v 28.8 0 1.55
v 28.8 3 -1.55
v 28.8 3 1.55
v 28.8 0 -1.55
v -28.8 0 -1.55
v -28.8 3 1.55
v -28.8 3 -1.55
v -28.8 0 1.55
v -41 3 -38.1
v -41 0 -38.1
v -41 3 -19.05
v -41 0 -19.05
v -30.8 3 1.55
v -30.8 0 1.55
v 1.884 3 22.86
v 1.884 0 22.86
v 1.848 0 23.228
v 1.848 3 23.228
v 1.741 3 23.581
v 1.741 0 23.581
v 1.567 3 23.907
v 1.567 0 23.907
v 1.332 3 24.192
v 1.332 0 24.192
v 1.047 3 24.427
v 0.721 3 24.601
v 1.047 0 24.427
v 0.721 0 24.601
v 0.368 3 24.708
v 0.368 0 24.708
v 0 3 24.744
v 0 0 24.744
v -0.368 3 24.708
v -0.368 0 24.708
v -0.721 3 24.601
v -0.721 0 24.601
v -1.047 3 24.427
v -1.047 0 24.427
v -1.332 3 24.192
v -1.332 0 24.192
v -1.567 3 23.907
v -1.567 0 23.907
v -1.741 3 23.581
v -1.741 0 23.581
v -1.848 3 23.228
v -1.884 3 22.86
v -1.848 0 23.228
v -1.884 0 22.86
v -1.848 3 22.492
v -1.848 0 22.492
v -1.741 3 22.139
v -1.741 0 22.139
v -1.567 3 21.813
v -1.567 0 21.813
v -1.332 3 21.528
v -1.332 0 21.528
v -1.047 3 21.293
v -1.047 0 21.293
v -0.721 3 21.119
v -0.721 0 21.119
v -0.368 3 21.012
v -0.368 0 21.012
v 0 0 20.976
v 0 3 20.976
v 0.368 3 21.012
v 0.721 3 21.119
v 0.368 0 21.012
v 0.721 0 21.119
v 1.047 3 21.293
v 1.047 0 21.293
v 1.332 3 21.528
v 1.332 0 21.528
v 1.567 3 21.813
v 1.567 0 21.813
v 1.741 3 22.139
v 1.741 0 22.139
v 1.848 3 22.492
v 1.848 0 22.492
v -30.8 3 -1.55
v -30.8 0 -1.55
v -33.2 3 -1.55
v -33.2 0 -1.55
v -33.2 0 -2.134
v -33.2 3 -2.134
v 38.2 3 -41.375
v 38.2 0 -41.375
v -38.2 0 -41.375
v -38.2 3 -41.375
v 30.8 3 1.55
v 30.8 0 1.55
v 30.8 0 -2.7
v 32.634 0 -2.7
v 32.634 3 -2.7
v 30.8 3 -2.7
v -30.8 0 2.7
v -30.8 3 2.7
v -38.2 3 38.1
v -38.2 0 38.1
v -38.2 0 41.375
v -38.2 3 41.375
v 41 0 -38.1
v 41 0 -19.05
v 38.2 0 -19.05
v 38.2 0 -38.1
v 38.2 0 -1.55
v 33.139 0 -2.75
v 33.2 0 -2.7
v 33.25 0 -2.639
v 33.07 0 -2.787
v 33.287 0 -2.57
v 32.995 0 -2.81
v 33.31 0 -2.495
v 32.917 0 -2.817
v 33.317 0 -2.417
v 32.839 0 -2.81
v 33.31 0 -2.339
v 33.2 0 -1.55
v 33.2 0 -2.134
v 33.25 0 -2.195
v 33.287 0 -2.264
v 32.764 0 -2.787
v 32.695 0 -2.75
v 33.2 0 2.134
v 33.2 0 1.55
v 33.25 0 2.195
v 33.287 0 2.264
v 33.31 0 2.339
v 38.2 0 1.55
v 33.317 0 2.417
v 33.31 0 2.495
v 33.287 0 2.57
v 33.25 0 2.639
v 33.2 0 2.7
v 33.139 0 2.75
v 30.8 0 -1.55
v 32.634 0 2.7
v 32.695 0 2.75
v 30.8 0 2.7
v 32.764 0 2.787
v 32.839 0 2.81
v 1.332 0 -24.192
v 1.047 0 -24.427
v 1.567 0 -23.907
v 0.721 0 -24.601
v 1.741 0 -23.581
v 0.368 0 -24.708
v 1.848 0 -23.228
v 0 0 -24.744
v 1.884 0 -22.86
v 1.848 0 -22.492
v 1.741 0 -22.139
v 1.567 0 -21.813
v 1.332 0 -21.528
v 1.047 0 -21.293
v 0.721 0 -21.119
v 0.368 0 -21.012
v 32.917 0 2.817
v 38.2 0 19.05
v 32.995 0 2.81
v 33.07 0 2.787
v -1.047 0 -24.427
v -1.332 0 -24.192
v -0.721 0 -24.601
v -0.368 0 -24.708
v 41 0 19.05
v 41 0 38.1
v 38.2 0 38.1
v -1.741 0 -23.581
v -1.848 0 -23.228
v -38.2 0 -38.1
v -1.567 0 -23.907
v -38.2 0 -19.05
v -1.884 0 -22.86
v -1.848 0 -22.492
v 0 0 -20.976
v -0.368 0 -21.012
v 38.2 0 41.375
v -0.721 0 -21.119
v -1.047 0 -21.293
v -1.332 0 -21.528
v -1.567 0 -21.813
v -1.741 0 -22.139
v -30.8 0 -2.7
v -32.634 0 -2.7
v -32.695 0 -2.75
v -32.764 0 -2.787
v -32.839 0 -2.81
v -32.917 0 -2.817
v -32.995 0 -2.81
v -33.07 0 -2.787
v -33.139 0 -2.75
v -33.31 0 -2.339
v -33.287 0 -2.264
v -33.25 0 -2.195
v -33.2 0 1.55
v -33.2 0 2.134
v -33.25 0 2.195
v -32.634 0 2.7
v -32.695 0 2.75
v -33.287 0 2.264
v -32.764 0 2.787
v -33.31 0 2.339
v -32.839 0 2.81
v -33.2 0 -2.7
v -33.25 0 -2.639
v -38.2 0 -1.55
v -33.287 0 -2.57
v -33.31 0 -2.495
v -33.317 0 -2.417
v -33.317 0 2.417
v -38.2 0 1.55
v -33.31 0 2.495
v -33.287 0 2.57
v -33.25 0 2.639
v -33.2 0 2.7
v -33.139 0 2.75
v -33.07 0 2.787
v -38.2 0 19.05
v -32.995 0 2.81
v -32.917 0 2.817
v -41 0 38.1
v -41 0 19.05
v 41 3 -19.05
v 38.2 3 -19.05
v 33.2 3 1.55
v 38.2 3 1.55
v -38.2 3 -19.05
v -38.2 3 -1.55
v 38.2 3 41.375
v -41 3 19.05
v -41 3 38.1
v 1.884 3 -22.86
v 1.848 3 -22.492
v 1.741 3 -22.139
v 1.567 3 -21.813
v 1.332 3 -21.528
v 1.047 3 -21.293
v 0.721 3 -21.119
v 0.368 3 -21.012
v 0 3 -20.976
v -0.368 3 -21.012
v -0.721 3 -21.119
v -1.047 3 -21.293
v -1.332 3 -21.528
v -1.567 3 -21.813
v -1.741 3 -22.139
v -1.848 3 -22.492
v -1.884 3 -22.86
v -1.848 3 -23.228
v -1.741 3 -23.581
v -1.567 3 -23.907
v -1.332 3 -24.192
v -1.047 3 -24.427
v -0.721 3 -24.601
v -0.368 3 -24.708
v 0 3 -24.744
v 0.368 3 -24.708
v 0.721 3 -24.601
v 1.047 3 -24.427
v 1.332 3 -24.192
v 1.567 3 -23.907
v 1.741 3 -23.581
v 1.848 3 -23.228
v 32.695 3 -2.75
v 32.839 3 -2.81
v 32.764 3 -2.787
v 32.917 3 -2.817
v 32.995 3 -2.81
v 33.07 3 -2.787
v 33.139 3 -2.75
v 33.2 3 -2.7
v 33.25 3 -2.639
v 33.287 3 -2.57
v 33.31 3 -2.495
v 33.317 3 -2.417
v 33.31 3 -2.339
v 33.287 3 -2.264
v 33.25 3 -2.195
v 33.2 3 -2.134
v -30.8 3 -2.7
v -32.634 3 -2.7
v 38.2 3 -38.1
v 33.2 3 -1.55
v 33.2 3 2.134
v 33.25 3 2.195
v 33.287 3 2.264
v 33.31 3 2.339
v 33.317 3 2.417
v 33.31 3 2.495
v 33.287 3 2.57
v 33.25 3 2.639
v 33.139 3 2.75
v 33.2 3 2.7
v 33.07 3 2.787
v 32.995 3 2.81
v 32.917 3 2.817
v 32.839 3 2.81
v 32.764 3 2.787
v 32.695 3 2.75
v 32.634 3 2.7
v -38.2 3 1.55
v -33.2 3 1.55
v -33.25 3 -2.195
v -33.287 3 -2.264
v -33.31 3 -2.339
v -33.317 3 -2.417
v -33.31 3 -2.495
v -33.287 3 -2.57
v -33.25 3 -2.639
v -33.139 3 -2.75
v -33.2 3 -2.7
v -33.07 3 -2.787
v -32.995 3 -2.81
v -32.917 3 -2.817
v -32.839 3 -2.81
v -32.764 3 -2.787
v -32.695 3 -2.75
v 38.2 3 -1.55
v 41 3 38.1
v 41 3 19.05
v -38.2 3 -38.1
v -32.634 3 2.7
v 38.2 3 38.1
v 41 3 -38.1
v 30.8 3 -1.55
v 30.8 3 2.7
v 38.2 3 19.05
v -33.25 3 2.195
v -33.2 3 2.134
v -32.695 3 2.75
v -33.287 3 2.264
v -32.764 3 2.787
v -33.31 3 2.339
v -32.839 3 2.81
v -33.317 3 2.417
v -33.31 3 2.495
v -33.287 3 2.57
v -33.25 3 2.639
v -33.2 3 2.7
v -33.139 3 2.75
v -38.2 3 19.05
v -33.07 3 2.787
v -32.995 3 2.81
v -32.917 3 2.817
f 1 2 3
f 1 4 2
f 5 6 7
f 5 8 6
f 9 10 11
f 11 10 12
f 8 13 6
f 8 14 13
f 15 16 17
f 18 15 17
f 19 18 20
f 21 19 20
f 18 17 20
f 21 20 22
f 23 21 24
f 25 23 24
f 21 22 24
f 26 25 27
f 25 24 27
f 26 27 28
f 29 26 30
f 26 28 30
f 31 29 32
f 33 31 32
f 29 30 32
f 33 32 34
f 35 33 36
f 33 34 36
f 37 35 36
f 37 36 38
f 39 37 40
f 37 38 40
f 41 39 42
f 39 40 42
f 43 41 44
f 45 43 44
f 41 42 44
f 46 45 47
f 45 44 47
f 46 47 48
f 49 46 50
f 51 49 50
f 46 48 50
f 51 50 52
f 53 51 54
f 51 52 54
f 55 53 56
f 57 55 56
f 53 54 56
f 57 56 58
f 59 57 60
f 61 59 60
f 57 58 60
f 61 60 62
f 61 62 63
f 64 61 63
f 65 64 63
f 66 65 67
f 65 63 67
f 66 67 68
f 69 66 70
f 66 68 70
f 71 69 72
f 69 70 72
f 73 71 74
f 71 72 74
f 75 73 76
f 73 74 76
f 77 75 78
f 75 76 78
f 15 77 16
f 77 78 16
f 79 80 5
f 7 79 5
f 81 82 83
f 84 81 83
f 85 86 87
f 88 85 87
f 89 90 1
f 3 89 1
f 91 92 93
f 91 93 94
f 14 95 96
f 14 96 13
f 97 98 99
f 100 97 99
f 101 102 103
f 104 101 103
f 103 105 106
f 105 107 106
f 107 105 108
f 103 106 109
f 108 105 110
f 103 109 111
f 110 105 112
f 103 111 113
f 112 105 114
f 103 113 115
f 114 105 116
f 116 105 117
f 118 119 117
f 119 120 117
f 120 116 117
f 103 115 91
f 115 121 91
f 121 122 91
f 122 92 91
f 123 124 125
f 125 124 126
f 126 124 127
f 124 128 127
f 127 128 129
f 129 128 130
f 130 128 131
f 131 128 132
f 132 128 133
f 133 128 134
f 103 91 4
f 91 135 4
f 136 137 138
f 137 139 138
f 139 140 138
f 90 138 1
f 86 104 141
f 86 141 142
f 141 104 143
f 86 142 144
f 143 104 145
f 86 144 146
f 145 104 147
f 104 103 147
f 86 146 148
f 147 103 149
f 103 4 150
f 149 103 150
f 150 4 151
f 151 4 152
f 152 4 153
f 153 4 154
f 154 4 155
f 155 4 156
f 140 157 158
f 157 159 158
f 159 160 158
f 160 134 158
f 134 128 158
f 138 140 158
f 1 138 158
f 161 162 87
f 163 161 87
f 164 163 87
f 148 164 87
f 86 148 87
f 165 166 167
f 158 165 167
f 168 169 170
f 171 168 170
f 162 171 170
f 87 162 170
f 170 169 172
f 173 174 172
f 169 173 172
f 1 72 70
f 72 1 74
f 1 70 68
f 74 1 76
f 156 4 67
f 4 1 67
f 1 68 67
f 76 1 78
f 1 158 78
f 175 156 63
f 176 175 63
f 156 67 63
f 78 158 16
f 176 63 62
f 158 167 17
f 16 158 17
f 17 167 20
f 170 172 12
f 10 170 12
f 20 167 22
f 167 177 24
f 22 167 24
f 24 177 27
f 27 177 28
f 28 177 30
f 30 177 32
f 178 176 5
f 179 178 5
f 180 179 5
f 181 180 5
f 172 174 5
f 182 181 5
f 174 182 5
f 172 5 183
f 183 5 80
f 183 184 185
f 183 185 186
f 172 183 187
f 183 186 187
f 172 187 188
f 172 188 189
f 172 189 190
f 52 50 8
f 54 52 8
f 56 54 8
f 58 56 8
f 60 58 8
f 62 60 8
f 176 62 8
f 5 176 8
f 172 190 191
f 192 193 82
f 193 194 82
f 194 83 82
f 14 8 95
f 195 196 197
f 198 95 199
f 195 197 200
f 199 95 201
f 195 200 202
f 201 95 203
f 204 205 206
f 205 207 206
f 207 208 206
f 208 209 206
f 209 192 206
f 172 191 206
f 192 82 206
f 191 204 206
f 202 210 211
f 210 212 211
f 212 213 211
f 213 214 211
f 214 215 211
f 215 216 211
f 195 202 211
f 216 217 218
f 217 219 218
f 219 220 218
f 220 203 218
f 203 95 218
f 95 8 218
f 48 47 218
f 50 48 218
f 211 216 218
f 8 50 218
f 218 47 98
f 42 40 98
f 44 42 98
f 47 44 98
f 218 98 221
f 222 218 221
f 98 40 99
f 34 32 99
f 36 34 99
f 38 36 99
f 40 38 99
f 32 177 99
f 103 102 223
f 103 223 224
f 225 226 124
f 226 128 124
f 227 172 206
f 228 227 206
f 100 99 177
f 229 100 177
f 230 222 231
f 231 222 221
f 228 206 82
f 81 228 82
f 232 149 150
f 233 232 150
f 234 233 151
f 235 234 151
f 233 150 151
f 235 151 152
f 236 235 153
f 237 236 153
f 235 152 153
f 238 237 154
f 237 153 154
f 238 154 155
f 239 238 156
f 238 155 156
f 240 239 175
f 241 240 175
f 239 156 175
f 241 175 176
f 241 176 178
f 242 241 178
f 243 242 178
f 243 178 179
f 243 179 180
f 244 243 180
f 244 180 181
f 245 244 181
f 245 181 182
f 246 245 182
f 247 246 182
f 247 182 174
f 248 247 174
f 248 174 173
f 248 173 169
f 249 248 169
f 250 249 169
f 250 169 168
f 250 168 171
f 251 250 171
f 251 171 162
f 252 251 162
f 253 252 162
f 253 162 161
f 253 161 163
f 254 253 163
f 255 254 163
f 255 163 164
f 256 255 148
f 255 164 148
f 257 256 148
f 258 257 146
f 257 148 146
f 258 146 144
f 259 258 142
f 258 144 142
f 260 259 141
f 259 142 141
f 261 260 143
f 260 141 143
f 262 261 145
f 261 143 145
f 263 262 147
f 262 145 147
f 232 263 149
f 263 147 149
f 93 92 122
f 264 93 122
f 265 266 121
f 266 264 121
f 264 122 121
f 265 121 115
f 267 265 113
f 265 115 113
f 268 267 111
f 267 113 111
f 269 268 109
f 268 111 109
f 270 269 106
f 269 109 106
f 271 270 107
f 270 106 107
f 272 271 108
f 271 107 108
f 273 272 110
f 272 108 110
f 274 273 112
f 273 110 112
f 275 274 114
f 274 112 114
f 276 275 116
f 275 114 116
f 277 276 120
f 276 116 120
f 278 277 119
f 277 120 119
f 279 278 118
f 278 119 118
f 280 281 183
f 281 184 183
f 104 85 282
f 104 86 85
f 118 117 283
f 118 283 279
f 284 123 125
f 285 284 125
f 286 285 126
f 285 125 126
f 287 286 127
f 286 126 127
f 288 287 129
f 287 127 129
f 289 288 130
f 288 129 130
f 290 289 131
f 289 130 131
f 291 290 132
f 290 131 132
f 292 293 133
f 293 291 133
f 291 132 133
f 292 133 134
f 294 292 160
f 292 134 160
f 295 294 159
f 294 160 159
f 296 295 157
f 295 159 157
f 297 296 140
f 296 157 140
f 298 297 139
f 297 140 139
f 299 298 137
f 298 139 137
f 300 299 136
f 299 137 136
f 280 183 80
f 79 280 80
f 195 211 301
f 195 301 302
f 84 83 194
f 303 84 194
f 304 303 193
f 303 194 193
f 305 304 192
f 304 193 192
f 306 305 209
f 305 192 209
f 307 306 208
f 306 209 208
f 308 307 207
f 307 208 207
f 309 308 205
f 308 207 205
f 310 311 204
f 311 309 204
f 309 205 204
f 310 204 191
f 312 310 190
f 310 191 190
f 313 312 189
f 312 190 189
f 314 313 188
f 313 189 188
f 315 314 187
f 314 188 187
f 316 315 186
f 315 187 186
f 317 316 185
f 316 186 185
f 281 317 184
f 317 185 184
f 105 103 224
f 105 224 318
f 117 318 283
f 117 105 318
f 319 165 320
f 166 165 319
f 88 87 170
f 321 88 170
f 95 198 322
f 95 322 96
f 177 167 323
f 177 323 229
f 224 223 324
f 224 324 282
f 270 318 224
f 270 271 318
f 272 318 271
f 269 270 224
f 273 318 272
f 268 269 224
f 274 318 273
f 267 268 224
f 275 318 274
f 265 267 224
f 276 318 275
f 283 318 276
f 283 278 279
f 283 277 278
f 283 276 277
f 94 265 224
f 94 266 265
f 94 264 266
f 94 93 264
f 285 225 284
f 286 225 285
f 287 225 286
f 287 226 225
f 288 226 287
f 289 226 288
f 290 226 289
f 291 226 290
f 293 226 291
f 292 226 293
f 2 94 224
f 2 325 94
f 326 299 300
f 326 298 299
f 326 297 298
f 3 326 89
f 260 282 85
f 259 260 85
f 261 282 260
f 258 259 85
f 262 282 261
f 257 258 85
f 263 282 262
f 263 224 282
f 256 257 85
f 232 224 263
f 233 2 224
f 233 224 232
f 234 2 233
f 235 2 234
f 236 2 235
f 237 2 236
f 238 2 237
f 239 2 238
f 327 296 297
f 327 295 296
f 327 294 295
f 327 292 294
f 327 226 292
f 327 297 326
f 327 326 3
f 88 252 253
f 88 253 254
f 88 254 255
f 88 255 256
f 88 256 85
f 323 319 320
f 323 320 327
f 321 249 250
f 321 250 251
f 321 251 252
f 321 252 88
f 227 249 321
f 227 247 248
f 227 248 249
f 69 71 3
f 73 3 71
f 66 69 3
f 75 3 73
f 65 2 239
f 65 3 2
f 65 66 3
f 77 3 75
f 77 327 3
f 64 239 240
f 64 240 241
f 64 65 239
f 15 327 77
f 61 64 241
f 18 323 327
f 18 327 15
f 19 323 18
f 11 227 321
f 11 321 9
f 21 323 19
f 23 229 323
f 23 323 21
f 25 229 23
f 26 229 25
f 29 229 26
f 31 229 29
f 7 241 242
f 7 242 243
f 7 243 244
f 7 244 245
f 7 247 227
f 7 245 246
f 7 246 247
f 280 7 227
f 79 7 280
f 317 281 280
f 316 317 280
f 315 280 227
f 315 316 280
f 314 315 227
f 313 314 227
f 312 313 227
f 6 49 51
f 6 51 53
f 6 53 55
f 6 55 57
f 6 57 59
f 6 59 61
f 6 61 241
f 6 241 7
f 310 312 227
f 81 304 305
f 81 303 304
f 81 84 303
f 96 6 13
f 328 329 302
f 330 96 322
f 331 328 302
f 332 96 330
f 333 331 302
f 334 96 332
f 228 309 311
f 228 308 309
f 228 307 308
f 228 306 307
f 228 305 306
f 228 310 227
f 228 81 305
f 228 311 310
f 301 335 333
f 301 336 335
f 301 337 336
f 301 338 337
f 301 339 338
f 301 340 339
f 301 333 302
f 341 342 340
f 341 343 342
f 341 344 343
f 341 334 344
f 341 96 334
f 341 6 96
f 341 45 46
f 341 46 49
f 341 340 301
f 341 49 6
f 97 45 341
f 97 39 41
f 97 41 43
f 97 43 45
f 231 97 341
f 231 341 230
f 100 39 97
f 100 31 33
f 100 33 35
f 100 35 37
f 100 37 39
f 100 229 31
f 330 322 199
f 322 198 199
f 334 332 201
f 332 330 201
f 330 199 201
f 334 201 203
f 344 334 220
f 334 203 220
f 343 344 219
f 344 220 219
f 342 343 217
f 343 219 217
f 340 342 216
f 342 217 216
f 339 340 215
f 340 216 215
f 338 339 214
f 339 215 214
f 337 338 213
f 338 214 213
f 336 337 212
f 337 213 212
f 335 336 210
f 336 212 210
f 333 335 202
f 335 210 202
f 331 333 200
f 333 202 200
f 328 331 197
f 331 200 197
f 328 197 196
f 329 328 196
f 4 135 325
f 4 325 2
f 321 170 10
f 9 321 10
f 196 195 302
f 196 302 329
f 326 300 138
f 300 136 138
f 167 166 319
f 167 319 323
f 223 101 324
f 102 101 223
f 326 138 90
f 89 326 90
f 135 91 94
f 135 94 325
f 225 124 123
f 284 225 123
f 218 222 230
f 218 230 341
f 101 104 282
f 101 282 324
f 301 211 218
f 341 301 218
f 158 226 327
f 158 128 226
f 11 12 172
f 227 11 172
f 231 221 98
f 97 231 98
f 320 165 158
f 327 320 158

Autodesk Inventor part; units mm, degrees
ref_plane "YZ Plane" through (0, 0, 0) normal (1, 0, 0) x (0, 1, 0)
ref_plane "XZ Plane" through (0, 0, 0) normal (0, 1, 0) x (-1, 0, 0)
ref_plane "XY Plane" through (0, 0, 0) normal (0, 0, 1) x (1, 0, 0)
sketch "Sketch1" plane through (0, 0, 0) normal (0, 1, 0) x (-1, 0, 0)
  line L0 (38.2, 41.375) -> (0, 41.375)
  line L1 (0, -41.375) -> (38.2, -41.375)
  line L2 (38.2, -41.375) -> (38.2, -38.1)
  line L3 (38.2, 41.375) -> (-38.2, -41.375) construction
  line L4 (-38.2, 41.375) -> (38.2, -41.375) construction
  line L5 (38.2, -38.1) -> (41, -38.1)
  line L6 (41, -38.1) -> (41, -19.05)
  line L7 (41, 38.1) -> (38.2, 38.1)
  line L8 (41, -19.05) -> (38.2, -19.05)
  line L9 (41, 19.05) -> (38.2, 19.05)
  line L10 (0, -57.1711) -> (0, 53.4379)
  line L11 (38.2, -38.1) -> (38.2, -19.05) construction
  line L12 (38.2, -19.05) -> (38.2, -1.55)
  line L13 (38.2, 19.05) -> (38.2, 38.1) construction
  line L14 (38.2, 38.1) -> (38.2, 41.375)
  line L15 (41, 19.05) -> (41, 38.1)
  line L16 (41, -19.05) -> (41, 19.05) construction
  line L17 (43.0653, 0) -> (18.1238, 0)
  line L18 (38.2, 1.55) -> (33.2, 1.55)
  line L19 (33.2, 1.55) -> (33.2, 2.1343)
  line L20 (33.2, 2.7) -> (32.6343, 2.7) construction
  line L21 (30.8, 2.7) -> (30.8, 1.55)
  line L22 (30.8, 1.55) -> (28.8, 1.55)
  line L23 (28.8, 1.55) -> (28.8, 0)
  arc A0 (33.2, 2.1343) -> (32.6343, 2.7) centre (32.9172, 2.4172) ccw
  line L24 (33.2, 2.1343) -> (33.2, 2.7) construction
  line L25 (32.6343, 2.7) -> (30.8, 2.7)
  line L26 (38.2, -1.55) -> (33.2, -1.55)
  line L27 (33.2, -1.55) -> (33.2, -2.1343)
  line L28 (30.8, -2.7) -> (30.8, -1.55)
  line L29 (30.8, -1.55) -> (28.8, -1.55)
  line L30 (28.8, -1.55) -> (28.8, 0)
  arc A1 (32.6343, -2.7) -> (33.2, -2.1343) centre (32.9172, -2.4172) ccw
  line L31 (32.6343, -2.7) -> (30.8, -2.7)
  line L32 (38.2, -1.55) -> (38.2, 1.55) construction
  line L33 (38.2, 1.55) -> (38.2, 19.05)
  line L34 (-38.2, 41.375) -> (0, 41.375)
  line L35 (0, -41.375) -> (-38.2, -41.375)
  line L36 (-38.2, -41.375) -> (-38.2, -38.1)
  line L37 (-38.2, -38.1) -> (-41, -38.1)
  line L38 (-41, -38.1) -> (-41, -19.05)
  line L39 (-41, 38.1) -> (-38.2, 38.1)
  line L40 (-41, -19.05) -> (-38.2, -19.05)
  line L41 (-41, 19.05) -> (-38.2, 19.05)
  line L42 (-38.2, -19.05) -> (-38.2, -1.55)
  line L43 (-38.2, 38.1) -> (-38.2, 41.375)
  line L44 (-41, 19.05) -> (-41, 38.1)
  line L45 (-38.2, 1.55) -> (-33.2, 1.55)
  line L46 (-33.2, 1.55) -> (-33.2, 2.1343)
  line L47 (-30.8, 2.7) -> (-30.8, 1.55)
  line L48 (-30.8, 1.55) -> (-28.8, 1.55)
  line L49 (-28.8, 1.55) -> (-28.8, 0)
  arc A2 (-32.6343, 2.7) -> (-33.2, 2.1343) centre (-32.9172, 2.4172) ccw
  line L50 (-32.6343, 2.7) -> (-30.8, 2.7)
  line L51 (-38.2, -1.55) -> (-33.2, -1.55)
  line L52 (-33.2, -1.55) -> (-33.2, -2.1343)
  arc A3 (-33.2, -2.1343) -> (-32.6343, -2.7) centre (-32.9172, -2.4172) ccw
  line L53 (-30.8, -2.7) -> (-30.8, -1.55)
  line L54 (-30.8, -1.55) -> (-28.8, -1.55)
  line L55 (-28.8, -1.55) -> (-28.8, 0)
  line L56 (-38.2, 1.55) -> (-38.2, 19.05)
  line L57 (-32.6343, -2.7) -> (-30.8, -2.7)
  point P0 (0, 0)
  point P1 (0, 0)
  dimension "d0" = 76.4
  dimension "d2" = 76.2
  dimension "d3" = 2.8
  dimension "d4" = 19.05
  dimension "d5" = 82.75
  dimension "d6" = 3.1
  dimension "d7" = 5
  dimension "d8" = 0.4
  dimension "d9" = 2.4
  dimension "d10" = 5.4
  dimension "d11" = 2
extrude "Extrusion1" add sketch "Sketch1" along normal blind 3
sketch "Sketch2" plane through (0, 0, 0) normal (0, -1, 0) x (1, 0, 0)
  circle A0 centre (0, -22.86) radius 16 construction
  circle A1 centre (0, 22.86) radius 16 construction
  circle A2 centre (0, -22.86) radius 1.8844
  circle A3 centre (0, 22.86) radius 1.8844
  point P0 (0, 0)
  dimension "d14" = 32
  dimension "d15" = 22.86
  dimension "d16" = 22.86
  dimension "d17" = 3.7687
extrude "Extrusion2" cut sketch "Sketch2" against normal through all
equation "\"d16\" = d15"
properties part number "MountBase"
